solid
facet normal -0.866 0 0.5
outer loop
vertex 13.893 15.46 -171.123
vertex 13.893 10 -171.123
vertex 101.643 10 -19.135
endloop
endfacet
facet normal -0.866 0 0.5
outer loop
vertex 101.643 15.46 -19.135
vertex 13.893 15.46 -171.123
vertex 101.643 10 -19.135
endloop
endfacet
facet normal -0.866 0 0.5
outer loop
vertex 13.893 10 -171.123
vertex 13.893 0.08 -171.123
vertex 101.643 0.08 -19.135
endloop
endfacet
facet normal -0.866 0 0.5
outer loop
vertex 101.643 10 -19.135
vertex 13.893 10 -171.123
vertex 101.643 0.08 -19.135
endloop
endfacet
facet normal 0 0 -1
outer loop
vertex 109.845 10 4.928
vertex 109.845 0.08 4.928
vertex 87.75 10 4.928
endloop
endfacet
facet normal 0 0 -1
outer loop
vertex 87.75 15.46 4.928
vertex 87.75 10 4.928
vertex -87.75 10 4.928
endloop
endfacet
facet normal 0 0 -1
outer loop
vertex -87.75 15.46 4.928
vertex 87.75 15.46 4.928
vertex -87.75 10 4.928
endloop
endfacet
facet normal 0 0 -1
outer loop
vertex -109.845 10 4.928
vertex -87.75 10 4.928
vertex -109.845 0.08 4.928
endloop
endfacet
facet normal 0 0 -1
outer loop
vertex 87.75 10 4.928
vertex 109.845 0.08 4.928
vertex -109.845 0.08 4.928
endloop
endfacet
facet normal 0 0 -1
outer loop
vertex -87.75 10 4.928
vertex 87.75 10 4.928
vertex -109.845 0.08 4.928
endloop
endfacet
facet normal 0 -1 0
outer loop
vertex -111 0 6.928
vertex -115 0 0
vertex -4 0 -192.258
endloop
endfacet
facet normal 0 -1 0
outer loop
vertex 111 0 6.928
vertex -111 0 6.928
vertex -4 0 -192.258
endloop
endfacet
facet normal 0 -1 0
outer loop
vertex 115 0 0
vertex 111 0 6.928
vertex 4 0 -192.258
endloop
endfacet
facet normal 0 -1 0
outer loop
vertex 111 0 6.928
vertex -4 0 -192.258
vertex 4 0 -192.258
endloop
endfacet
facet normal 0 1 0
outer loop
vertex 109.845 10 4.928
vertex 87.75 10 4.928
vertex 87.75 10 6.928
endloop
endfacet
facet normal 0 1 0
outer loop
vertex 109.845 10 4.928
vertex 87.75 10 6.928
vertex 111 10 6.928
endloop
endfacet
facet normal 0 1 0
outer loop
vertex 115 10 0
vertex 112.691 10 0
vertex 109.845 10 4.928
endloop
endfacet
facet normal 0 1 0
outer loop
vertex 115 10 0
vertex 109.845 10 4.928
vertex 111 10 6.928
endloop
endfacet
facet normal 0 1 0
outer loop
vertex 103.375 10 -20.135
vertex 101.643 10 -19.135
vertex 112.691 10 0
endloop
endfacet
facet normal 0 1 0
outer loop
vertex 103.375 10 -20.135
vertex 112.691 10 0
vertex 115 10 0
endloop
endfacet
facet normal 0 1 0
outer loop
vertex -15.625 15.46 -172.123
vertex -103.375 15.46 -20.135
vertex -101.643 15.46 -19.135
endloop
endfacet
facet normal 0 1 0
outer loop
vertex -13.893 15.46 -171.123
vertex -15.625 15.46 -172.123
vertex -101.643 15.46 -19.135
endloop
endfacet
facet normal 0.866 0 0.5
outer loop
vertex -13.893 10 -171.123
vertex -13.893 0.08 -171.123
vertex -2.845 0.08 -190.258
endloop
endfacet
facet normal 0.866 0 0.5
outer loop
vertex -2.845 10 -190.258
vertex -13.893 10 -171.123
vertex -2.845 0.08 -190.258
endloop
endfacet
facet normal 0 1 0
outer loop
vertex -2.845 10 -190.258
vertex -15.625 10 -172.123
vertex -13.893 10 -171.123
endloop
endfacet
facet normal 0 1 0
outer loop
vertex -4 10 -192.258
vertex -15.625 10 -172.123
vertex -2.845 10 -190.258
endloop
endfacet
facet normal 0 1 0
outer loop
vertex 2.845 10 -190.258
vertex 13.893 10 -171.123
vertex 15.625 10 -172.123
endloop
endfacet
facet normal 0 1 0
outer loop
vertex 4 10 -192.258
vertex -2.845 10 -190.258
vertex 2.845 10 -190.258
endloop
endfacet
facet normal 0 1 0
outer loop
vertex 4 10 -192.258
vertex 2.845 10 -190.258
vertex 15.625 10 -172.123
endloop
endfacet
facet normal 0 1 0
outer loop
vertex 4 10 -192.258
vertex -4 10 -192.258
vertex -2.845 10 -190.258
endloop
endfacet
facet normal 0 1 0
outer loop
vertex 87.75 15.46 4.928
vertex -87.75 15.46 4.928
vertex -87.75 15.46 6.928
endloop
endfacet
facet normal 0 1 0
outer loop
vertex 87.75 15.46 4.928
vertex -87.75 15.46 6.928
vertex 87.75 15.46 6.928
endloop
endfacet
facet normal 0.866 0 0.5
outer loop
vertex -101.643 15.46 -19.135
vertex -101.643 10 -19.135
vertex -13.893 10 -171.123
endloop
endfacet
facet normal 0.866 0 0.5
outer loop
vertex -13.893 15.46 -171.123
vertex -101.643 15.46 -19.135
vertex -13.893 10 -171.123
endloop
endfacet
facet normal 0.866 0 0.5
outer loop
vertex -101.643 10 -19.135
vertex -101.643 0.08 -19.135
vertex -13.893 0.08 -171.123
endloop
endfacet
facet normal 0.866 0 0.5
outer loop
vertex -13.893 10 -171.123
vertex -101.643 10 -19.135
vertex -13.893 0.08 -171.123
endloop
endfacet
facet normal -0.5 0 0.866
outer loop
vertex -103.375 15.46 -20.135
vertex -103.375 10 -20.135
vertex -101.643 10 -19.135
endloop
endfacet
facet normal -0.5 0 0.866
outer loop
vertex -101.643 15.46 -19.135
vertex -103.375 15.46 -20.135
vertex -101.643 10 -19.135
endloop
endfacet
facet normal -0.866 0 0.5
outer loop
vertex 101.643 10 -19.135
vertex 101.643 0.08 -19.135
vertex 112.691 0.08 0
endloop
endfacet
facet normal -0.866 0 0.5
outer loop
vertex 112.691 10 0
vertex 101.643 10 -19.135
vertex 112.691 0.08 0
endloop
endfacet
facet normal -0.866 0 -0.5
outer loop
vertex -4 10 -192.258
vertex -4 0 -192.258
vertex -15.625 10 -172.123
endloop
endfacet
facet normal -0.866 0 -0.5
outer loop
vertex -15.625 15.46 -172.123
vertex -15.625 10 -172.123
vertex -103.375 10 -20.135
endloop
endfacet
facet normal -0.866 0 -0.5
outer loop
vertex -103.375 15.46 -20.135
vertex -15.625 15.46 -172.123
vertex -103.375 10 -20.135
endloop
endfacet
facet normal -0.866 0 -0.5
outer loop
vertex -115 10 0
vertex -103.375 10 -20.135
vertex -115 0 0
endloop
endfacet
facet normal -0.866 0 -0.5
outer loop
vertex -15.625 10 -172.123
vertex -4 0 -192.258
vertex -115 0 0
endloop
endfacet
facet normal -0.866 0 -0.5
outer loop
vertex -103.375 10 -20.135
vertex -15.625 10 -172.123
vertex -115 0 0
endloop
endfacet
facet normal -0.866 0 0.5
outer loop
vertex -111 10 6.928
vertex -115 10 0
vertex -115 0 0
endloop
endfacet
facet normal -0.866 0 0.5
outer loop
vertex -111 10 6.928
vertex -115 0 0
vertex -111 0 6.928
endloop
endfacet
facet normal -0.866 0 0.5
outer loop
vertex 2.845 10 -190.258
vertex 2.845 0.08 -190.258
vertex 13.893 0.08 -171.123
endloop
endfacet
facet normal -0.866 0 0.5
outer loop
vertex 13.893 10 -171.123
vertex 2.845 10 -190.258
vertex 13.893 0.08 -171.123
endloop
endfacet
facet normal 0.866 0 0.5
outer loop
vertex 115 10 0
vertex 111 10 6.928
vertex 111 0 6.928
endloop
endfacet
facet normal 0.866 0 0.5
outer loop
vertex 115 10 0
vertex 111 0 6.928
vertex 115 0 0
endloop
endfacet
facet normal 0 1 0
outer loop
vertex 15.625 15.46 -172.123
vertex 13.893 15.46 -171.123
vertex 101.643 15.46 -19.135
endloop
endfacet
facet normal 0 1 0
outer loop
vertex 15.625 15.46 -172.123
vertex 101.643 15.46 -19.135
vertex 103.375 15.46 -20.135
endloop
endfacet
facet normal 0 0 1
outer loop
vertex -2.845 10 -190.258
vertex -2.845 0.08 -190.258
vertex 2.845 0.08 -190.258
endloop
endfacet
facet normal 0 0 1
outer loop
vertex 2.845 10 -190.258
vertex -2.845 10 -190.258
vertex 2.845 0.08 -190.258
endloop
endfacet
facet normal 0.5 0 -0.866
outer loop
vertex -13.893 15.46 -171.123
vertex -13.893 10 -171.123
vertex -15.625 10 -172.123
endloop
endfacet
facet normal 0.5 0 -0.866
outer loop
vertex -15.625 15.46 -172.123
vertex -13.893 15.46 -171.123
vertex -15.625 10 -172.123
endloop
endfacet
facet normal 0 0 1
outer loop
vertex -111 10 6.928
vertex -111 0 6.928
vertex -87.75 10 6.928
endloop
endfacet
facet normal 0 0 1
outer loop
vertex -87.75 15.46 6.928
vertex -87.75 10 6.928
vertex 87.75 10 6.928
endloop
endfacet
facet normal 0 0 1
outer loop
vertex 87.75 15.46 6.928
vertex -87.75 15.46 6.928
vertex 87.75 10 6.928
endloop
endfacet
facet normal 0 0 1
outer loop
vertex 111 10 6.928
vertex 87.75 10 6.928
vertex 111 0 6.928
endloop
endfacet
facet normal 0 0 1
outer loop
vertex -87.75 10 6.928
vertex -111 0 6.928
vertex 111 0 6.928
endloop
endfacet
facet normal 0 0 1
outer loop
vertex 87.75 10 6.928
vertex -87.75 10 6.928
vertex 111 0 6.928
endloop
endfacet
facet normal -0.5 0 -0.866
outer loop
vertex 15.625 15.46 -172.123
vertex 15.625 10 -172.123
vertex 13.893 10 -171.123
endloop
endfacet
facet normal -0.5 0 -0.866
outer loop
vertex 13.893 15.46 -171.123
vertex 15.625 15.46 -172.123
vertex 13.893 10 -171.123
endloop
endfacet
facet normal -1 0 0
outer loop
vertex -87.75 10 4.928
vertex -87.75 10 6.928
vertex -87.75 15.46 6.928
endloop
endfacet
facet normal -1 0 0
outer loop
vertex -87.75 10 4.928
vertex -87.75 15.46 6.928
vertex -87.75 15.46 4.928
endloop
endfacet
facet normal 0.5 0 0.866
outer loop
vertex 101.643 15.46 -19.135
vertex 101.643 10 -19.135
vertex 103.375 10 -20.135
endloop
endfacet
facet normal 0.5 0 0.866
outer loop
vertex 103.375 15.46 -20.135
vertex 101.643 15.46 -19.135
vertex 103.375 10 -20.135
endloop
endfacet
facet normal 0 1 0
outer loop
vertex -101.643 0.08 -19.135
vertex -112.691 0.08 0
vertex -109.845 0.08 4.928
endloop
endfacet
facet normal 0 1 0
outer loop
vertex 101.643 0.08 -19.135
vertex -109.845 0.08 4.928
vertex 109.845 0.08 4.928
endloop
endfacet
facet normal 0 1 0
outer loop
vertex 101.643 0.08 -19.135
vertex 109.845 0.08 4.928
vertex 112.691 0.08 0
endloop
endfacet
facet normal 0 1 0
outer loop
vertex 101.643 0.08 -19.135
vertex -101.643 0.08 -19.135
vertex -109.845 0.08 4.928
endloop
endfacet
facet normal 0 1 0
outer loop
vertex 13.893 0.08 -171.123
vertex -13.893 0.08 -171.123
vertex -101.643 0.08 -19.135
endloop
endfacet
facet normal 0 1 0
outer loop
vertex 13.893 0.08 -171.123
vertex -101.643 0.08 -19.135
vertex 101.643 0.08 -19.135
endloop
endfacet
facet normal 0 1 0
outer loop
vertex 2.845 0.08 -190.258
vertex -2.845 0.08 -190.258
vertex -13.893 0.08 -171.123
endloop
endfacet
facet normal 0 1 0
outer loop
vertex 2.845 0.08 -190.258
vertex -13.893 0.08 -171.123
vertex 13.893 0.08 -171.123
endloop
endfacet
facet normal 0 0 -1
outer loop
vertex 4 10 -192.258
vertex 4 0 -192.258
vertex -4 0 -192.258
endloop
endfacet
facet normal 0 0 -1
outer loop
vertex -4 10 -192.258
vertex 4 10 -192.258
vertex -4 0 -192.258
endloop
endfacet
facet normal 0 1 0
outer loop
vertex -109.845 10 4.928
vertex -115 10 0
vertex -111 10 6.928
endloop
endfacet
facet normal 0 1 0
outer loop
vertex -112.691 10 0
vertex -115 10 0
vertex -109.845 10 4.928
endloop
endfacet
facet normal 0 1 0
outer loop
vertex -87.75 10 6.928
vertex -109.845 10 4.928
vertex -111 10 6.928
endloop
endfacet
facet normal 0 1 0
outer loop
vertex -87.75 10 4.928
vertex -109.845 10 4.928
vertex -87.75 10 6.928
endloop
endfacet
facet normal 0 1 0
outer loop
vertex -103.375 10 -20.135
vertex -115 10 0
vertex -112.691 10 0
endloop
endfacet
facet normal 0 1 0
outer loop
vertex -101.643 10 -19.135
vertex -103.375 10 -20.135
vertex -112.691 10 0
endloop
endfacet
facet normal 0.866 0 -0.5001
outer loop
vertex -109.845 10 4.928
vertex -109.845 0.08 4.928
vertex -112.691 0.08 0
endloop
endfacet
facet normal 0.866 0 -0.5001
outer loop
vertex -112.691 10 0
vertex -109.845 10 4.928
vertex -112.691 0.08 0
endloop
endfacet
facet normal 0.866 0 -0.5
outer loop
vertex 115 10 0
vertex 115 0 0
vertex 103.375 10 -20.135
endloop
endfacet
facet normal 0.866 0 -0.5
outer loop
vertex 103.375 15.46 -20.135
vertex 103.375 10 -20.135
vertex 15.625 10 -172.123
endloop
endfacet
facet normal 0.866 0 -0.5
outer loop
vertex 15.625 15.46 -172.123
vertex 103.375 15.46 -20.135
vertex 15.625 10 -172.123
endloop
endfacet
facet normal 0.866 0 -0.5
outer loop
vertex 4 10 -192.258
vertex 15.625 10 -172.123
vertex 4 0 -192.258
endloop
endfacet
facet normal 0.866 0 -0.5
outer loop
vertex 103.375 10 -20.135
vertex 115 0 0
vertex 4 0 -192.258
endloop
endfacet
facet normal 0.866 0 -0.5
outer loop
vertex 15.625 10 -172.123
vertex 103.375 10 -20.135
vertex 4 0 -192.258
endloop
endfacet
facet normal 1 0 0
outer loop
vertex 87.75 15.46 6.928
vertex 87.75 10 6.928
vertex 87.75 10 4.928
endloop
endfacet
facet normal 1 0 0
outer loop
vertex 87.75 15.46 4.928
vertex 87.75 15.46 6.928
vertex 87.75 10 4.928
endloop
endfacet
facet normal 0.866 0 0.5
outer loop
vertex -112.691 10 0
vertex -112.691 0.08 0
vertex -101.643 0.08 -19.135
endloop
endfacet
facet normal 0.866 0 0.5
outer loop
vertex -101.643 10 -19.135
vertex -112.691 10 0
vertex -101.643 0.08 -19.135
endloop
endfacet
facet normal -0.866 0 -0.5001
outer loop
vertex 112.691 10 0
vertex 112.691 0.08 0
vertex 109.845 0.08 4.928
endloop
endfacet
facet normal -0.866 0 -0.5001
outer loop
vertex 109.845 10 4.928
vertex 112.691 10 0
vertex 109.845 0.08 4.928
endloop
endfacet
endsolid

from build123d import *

# Parameters (mm, degrees)
BOSS_EXTRUDE1_DEPTH = 0.08
BOSS_EXTRUDE2_DEPTH = 10
SKETCH1_4_W         = 175.5
SKETCH1_4_H         = 2
BOSS_EXTRUDE3_DEPTH = 15.46


with BuildPart() as part:
    # Sketch1 → Boss-Extrude1 (new body)
    with BuildSketch(Plane(origin=(0, 0, 0), x_dir=(1, 0, 0), z_dir=(0, 1, 0))):
        Polygon((-115, 0), (-111, -6.92820323), (111, -6.92820323), (115, 0), (4, 192.25763964), (-4, 192.25763964), align=None)
    extrude(amount=BOSS_EXTRUDE1_DEPTH)

    # Sketch1<3> → Boss-Extrude2 (add)
    with BuildSketch(Plane(origin=(0, 0, 0), x_dir=(1, 0, 0), z_dir=(0, 1, 0))):
        Polygon((-103.375, 20.135090638), (-115, 0), (-111, -6.92820323), (-87.75, -6.92820323), (-87.75, -4.92820323), (-109.845299462, -4.92820323), (-112.690598923, 0), (-101.642949192, 19.135090638), align=None)
        Polygon((-4, 192.25763964), (-15.625, 172.122549002), (-13.892949192, 171.122549002), (-2.845299462, 190.25763964), (2.845299462, 190.25763964), (13.892949192, 171.122549002), (15.625, 172.122549002), (4, 192.25763964), align=None)
        Polygon((87.75, -4.92820323), (87.75, -6.92820323), (111, -6.92820323), (115, 0), (103.375, 20.135090638), (101.642949192, 19.135090638), (112.690598923, 0), (109.845299462, -4.92820323), align=None)
    extrude(amount=BOSS_EXTRUDE2_DEPTH)

    # Sketch1<4> → Boss-Extrude3 (add)
    with BuildSketch(Plane(origin=(0, 0, 0), x_dir=(1, 0, 0), z_dir=(0, 1, 0))):
        Polygon((-15.625, 172.122549002), (-103.375, 20.135090638), (-101.642949192, 19.135090638), (-13.892949192, 171.122549002), align=None)
        with Locations((0, -5.92820323)):
            Rectangle(SKETCH1_4_W, SKETCH1_4_H)
        Polygon((103.375, 20.135090638), (15.625, 172.122549002), (13.892949192, 171.122549002), (101.642949192, 19.135090638), align=None)
    extrude(amount=BOSS_EXTRUDE3_DEPTH)


solid = part.part
